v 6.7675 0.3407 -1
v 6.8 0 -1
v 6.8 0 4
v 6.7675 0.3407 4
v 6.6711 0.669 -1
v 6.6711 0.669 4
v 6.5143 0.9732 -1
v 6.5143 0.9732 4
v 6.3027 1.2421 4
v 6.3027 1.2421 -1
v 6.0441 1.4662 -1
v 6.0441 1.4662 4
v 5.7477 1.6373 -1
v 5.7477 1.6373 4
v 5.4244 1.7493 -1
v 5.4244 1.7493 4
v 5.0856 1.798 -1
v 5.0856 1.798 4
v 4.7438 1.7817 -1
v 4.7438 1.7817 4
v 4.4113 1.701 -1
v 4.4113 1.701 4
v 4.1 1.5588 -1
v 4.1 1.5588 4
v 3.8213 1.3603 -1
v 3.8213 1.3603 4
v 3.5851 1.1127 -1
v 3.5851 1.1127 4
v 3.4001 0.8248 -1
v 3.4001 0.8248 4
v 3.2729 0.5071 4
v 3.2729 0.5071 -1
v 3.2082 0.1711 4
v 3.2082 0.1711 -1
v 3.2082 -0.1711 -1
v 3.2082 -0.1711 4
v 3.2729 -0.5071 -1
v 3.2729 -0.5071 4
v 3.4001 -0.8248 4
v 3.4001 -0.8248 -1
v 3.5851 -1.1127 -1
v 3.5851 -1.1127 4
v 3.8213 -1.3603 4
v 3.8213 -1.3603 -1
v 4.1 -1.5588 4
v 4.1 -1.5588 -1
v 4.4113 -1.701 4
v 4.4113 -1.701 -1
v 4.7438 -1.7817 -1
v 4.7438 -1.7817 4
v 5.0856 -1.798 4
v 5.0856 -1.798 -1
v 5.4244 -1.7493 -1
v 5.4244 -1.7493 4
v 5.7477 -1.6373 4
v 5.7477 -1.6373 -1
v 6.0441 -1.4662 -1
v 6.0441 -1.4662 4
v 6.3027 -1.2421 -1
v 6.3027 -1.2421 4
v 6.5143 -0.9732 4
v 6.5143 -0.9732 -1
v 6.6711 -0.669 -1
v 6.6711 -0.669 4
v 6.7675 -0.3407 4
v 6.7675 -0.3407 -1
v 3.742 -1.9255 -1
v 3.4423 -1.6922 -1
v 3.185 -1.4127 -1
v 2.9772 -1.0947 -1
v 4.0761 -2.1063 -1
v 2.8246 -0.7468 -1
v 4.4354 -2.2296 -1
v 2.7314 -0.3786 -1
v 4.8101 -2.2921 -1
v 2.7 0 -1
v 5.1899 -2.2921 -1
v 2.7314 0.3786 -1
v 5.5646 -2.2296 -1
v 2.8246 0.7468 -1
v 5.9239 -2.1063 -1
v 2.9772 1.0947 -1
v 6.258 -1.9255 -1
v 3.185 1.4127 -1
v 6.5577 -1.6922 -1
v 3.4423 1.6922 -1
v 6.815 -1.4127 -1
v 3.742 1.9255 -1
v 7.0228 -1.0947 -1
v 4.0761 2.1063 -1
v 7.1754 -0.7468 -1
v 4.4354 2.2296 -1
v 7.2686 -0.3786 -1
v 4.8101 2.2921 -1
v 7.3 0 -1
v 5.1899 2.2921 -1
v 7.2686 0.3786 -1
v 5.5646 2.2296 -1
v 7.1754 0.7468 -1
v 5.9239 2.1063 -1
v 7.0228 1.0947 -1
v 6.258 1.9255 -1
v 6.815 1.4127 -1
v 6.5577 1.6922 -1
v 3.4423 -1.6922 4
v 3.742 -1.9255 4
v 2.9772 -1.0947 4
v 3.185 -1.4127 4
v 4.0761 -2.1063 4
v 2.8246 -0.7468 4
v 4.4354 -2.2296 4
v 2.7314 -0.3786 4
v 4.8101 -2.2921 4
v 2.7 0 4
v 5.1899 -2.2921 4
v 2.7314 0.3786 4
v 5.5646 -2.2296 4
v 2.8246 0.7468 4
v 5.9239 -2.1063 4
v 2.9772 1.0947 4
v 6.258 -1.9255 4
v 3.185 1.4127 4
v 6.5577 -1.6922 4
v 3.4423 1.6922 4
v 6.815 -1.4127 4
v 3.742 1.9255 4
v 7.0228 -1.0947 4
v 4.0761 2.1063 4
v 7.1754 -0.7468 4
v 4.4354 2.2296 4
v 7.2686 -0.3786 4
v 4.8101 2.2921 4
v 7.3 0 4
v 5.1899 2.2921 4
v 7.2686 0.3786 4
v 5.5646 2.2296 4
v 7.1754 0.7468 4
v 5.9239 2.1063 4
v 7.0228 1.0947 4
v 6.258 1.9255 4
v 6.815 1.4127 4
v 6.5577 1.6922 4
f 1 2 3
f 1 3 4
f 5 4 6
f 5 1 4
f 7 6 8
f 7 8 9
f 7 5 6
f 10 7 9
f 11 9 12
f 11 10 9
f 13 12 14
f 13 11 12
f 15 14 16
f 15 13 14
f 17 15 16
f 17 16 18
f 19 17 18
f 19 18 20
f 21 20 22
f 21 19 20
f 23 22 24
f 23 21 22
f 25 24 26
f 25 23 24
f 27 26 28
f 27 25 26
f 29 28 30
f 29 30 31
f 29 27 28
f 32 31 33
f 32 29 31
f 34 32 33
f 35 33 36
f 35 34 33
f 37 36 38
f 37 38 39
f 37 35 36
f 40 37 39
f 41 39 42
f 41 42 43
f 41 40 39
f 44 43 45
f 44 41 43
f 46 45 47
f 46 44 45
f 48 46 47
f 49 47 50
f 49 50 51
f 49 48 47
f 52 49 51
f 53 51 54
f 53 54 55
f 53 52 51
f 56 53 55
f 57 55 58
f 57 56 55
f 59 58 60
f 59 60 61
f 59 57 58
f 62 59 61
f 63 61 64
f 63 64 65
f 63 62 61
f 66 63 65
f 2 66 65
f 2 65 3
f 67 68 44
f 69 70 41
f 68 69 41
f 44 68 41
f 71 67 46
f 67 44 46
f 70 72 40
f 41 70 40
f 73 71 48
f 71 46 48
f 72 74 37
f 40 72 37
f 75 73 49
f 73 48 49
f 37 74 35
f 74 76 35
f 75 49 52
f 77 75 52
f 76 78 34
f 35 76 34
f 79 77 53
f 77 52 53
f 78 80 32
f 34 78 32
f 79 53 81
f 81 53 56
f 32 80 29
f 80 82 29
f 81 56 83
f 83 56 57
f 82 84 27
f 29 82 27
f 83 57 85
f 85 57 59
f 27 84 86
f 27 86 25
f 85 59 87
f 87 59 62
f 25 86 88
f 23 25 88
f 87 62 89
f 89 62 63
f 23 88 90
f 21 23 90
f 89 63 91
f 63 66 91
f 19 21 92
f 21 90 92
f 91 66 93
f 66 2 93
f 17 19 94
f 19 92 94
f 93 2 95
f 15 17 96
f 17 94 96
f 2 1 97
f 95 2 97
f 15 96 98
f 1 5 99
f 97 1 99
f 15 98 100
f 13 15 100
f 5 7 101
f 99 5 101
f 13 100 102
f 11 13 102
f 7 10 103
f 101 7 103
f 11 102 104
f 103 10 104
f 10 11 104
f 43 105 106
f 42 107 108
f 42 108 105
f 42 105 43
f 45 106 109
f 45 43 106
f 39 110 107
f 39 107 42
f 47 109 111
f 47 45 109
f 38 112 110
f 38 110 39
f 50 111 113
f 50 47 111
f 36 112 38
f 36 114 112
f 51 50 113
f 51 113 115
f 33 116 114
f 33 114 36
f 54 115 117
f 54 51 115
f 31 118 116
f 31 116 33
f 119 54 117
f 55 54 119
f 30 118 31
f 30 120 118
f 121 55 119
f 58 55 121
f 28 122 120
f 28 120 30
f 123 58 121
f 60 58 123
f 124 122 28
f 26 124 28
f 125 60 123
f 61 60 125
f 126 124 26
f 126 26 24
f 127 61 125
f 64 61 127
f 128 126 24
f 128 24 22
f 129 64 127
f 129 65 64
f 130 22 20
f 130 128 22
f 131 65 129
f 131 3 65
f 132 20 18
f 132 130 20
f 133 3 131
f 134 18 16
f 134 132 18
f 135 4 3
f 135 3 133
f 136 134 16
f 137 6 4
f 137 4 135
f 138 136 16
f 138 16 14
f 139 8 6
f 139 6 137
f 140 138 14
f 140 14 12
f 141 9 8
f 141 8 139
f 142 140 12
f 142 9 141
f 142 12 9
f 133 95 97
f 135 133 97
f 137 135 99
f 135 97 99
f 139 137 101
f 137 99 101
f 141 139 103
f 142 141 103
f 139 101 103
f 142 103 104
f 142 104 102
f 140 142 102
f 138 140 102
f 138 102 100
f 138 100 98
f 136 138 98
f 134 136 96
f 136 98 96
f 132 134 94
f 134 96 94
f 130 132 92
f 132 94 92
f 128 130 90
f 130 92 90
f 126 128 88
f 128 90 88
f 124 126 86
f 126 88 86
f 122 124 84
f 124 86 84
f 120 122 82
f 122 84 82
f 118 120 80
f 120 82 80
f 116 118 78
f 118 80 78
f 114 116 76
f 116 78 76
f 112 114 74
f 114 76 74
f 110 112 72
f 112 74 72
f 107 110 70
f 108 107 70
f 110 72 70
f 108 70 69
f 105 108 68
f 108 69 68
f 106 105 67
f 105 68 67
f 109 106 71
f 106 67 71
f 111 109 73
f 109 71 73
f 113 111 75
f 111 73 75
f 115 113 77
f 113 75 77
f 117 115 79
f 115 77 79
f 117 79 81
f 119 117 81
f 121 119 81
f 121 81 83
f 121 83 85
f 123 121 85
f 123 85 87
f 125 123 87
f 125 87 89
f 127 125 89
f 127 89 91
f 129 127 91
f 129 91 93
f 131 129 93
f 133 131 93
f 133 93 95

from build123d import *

# Parameters (mm, degrees)
CYLINDER017_R     = 1.8
CYLINDER017_DEPTH = 5
CYLINDER016_R     = 2.3
CYLINDER016_DEPTH = 5


with BuildPart() as cylinder017:
    # Cylinder017 → Cylinder017 (new body)
    with BuildSketch(Plane(origin=(5, 0, -1), x_dir=(1, 0, 0), z_dir=(0, 0, 1))):
        Circle(CYLINDER017_R)
    extrude(amount=CYLINDER017_DEPTH)


with BuildPart() as cut007:
    # Cylinder016 → Cylinder016 (new body)
    with BuildSketch(Plane(origin=(5, 0, -1), x_dir=(1, 0, 0), z_dir=(0, 0, 1))):
        Circle(CYLINDER016_R)
    extrude(amount=CYLINDER016_DEPTH)

    # Cut007: cut Cylinder017
    add(cylinder017.part, mode=Mode.SUBTRACT)


solid = cut007.part
